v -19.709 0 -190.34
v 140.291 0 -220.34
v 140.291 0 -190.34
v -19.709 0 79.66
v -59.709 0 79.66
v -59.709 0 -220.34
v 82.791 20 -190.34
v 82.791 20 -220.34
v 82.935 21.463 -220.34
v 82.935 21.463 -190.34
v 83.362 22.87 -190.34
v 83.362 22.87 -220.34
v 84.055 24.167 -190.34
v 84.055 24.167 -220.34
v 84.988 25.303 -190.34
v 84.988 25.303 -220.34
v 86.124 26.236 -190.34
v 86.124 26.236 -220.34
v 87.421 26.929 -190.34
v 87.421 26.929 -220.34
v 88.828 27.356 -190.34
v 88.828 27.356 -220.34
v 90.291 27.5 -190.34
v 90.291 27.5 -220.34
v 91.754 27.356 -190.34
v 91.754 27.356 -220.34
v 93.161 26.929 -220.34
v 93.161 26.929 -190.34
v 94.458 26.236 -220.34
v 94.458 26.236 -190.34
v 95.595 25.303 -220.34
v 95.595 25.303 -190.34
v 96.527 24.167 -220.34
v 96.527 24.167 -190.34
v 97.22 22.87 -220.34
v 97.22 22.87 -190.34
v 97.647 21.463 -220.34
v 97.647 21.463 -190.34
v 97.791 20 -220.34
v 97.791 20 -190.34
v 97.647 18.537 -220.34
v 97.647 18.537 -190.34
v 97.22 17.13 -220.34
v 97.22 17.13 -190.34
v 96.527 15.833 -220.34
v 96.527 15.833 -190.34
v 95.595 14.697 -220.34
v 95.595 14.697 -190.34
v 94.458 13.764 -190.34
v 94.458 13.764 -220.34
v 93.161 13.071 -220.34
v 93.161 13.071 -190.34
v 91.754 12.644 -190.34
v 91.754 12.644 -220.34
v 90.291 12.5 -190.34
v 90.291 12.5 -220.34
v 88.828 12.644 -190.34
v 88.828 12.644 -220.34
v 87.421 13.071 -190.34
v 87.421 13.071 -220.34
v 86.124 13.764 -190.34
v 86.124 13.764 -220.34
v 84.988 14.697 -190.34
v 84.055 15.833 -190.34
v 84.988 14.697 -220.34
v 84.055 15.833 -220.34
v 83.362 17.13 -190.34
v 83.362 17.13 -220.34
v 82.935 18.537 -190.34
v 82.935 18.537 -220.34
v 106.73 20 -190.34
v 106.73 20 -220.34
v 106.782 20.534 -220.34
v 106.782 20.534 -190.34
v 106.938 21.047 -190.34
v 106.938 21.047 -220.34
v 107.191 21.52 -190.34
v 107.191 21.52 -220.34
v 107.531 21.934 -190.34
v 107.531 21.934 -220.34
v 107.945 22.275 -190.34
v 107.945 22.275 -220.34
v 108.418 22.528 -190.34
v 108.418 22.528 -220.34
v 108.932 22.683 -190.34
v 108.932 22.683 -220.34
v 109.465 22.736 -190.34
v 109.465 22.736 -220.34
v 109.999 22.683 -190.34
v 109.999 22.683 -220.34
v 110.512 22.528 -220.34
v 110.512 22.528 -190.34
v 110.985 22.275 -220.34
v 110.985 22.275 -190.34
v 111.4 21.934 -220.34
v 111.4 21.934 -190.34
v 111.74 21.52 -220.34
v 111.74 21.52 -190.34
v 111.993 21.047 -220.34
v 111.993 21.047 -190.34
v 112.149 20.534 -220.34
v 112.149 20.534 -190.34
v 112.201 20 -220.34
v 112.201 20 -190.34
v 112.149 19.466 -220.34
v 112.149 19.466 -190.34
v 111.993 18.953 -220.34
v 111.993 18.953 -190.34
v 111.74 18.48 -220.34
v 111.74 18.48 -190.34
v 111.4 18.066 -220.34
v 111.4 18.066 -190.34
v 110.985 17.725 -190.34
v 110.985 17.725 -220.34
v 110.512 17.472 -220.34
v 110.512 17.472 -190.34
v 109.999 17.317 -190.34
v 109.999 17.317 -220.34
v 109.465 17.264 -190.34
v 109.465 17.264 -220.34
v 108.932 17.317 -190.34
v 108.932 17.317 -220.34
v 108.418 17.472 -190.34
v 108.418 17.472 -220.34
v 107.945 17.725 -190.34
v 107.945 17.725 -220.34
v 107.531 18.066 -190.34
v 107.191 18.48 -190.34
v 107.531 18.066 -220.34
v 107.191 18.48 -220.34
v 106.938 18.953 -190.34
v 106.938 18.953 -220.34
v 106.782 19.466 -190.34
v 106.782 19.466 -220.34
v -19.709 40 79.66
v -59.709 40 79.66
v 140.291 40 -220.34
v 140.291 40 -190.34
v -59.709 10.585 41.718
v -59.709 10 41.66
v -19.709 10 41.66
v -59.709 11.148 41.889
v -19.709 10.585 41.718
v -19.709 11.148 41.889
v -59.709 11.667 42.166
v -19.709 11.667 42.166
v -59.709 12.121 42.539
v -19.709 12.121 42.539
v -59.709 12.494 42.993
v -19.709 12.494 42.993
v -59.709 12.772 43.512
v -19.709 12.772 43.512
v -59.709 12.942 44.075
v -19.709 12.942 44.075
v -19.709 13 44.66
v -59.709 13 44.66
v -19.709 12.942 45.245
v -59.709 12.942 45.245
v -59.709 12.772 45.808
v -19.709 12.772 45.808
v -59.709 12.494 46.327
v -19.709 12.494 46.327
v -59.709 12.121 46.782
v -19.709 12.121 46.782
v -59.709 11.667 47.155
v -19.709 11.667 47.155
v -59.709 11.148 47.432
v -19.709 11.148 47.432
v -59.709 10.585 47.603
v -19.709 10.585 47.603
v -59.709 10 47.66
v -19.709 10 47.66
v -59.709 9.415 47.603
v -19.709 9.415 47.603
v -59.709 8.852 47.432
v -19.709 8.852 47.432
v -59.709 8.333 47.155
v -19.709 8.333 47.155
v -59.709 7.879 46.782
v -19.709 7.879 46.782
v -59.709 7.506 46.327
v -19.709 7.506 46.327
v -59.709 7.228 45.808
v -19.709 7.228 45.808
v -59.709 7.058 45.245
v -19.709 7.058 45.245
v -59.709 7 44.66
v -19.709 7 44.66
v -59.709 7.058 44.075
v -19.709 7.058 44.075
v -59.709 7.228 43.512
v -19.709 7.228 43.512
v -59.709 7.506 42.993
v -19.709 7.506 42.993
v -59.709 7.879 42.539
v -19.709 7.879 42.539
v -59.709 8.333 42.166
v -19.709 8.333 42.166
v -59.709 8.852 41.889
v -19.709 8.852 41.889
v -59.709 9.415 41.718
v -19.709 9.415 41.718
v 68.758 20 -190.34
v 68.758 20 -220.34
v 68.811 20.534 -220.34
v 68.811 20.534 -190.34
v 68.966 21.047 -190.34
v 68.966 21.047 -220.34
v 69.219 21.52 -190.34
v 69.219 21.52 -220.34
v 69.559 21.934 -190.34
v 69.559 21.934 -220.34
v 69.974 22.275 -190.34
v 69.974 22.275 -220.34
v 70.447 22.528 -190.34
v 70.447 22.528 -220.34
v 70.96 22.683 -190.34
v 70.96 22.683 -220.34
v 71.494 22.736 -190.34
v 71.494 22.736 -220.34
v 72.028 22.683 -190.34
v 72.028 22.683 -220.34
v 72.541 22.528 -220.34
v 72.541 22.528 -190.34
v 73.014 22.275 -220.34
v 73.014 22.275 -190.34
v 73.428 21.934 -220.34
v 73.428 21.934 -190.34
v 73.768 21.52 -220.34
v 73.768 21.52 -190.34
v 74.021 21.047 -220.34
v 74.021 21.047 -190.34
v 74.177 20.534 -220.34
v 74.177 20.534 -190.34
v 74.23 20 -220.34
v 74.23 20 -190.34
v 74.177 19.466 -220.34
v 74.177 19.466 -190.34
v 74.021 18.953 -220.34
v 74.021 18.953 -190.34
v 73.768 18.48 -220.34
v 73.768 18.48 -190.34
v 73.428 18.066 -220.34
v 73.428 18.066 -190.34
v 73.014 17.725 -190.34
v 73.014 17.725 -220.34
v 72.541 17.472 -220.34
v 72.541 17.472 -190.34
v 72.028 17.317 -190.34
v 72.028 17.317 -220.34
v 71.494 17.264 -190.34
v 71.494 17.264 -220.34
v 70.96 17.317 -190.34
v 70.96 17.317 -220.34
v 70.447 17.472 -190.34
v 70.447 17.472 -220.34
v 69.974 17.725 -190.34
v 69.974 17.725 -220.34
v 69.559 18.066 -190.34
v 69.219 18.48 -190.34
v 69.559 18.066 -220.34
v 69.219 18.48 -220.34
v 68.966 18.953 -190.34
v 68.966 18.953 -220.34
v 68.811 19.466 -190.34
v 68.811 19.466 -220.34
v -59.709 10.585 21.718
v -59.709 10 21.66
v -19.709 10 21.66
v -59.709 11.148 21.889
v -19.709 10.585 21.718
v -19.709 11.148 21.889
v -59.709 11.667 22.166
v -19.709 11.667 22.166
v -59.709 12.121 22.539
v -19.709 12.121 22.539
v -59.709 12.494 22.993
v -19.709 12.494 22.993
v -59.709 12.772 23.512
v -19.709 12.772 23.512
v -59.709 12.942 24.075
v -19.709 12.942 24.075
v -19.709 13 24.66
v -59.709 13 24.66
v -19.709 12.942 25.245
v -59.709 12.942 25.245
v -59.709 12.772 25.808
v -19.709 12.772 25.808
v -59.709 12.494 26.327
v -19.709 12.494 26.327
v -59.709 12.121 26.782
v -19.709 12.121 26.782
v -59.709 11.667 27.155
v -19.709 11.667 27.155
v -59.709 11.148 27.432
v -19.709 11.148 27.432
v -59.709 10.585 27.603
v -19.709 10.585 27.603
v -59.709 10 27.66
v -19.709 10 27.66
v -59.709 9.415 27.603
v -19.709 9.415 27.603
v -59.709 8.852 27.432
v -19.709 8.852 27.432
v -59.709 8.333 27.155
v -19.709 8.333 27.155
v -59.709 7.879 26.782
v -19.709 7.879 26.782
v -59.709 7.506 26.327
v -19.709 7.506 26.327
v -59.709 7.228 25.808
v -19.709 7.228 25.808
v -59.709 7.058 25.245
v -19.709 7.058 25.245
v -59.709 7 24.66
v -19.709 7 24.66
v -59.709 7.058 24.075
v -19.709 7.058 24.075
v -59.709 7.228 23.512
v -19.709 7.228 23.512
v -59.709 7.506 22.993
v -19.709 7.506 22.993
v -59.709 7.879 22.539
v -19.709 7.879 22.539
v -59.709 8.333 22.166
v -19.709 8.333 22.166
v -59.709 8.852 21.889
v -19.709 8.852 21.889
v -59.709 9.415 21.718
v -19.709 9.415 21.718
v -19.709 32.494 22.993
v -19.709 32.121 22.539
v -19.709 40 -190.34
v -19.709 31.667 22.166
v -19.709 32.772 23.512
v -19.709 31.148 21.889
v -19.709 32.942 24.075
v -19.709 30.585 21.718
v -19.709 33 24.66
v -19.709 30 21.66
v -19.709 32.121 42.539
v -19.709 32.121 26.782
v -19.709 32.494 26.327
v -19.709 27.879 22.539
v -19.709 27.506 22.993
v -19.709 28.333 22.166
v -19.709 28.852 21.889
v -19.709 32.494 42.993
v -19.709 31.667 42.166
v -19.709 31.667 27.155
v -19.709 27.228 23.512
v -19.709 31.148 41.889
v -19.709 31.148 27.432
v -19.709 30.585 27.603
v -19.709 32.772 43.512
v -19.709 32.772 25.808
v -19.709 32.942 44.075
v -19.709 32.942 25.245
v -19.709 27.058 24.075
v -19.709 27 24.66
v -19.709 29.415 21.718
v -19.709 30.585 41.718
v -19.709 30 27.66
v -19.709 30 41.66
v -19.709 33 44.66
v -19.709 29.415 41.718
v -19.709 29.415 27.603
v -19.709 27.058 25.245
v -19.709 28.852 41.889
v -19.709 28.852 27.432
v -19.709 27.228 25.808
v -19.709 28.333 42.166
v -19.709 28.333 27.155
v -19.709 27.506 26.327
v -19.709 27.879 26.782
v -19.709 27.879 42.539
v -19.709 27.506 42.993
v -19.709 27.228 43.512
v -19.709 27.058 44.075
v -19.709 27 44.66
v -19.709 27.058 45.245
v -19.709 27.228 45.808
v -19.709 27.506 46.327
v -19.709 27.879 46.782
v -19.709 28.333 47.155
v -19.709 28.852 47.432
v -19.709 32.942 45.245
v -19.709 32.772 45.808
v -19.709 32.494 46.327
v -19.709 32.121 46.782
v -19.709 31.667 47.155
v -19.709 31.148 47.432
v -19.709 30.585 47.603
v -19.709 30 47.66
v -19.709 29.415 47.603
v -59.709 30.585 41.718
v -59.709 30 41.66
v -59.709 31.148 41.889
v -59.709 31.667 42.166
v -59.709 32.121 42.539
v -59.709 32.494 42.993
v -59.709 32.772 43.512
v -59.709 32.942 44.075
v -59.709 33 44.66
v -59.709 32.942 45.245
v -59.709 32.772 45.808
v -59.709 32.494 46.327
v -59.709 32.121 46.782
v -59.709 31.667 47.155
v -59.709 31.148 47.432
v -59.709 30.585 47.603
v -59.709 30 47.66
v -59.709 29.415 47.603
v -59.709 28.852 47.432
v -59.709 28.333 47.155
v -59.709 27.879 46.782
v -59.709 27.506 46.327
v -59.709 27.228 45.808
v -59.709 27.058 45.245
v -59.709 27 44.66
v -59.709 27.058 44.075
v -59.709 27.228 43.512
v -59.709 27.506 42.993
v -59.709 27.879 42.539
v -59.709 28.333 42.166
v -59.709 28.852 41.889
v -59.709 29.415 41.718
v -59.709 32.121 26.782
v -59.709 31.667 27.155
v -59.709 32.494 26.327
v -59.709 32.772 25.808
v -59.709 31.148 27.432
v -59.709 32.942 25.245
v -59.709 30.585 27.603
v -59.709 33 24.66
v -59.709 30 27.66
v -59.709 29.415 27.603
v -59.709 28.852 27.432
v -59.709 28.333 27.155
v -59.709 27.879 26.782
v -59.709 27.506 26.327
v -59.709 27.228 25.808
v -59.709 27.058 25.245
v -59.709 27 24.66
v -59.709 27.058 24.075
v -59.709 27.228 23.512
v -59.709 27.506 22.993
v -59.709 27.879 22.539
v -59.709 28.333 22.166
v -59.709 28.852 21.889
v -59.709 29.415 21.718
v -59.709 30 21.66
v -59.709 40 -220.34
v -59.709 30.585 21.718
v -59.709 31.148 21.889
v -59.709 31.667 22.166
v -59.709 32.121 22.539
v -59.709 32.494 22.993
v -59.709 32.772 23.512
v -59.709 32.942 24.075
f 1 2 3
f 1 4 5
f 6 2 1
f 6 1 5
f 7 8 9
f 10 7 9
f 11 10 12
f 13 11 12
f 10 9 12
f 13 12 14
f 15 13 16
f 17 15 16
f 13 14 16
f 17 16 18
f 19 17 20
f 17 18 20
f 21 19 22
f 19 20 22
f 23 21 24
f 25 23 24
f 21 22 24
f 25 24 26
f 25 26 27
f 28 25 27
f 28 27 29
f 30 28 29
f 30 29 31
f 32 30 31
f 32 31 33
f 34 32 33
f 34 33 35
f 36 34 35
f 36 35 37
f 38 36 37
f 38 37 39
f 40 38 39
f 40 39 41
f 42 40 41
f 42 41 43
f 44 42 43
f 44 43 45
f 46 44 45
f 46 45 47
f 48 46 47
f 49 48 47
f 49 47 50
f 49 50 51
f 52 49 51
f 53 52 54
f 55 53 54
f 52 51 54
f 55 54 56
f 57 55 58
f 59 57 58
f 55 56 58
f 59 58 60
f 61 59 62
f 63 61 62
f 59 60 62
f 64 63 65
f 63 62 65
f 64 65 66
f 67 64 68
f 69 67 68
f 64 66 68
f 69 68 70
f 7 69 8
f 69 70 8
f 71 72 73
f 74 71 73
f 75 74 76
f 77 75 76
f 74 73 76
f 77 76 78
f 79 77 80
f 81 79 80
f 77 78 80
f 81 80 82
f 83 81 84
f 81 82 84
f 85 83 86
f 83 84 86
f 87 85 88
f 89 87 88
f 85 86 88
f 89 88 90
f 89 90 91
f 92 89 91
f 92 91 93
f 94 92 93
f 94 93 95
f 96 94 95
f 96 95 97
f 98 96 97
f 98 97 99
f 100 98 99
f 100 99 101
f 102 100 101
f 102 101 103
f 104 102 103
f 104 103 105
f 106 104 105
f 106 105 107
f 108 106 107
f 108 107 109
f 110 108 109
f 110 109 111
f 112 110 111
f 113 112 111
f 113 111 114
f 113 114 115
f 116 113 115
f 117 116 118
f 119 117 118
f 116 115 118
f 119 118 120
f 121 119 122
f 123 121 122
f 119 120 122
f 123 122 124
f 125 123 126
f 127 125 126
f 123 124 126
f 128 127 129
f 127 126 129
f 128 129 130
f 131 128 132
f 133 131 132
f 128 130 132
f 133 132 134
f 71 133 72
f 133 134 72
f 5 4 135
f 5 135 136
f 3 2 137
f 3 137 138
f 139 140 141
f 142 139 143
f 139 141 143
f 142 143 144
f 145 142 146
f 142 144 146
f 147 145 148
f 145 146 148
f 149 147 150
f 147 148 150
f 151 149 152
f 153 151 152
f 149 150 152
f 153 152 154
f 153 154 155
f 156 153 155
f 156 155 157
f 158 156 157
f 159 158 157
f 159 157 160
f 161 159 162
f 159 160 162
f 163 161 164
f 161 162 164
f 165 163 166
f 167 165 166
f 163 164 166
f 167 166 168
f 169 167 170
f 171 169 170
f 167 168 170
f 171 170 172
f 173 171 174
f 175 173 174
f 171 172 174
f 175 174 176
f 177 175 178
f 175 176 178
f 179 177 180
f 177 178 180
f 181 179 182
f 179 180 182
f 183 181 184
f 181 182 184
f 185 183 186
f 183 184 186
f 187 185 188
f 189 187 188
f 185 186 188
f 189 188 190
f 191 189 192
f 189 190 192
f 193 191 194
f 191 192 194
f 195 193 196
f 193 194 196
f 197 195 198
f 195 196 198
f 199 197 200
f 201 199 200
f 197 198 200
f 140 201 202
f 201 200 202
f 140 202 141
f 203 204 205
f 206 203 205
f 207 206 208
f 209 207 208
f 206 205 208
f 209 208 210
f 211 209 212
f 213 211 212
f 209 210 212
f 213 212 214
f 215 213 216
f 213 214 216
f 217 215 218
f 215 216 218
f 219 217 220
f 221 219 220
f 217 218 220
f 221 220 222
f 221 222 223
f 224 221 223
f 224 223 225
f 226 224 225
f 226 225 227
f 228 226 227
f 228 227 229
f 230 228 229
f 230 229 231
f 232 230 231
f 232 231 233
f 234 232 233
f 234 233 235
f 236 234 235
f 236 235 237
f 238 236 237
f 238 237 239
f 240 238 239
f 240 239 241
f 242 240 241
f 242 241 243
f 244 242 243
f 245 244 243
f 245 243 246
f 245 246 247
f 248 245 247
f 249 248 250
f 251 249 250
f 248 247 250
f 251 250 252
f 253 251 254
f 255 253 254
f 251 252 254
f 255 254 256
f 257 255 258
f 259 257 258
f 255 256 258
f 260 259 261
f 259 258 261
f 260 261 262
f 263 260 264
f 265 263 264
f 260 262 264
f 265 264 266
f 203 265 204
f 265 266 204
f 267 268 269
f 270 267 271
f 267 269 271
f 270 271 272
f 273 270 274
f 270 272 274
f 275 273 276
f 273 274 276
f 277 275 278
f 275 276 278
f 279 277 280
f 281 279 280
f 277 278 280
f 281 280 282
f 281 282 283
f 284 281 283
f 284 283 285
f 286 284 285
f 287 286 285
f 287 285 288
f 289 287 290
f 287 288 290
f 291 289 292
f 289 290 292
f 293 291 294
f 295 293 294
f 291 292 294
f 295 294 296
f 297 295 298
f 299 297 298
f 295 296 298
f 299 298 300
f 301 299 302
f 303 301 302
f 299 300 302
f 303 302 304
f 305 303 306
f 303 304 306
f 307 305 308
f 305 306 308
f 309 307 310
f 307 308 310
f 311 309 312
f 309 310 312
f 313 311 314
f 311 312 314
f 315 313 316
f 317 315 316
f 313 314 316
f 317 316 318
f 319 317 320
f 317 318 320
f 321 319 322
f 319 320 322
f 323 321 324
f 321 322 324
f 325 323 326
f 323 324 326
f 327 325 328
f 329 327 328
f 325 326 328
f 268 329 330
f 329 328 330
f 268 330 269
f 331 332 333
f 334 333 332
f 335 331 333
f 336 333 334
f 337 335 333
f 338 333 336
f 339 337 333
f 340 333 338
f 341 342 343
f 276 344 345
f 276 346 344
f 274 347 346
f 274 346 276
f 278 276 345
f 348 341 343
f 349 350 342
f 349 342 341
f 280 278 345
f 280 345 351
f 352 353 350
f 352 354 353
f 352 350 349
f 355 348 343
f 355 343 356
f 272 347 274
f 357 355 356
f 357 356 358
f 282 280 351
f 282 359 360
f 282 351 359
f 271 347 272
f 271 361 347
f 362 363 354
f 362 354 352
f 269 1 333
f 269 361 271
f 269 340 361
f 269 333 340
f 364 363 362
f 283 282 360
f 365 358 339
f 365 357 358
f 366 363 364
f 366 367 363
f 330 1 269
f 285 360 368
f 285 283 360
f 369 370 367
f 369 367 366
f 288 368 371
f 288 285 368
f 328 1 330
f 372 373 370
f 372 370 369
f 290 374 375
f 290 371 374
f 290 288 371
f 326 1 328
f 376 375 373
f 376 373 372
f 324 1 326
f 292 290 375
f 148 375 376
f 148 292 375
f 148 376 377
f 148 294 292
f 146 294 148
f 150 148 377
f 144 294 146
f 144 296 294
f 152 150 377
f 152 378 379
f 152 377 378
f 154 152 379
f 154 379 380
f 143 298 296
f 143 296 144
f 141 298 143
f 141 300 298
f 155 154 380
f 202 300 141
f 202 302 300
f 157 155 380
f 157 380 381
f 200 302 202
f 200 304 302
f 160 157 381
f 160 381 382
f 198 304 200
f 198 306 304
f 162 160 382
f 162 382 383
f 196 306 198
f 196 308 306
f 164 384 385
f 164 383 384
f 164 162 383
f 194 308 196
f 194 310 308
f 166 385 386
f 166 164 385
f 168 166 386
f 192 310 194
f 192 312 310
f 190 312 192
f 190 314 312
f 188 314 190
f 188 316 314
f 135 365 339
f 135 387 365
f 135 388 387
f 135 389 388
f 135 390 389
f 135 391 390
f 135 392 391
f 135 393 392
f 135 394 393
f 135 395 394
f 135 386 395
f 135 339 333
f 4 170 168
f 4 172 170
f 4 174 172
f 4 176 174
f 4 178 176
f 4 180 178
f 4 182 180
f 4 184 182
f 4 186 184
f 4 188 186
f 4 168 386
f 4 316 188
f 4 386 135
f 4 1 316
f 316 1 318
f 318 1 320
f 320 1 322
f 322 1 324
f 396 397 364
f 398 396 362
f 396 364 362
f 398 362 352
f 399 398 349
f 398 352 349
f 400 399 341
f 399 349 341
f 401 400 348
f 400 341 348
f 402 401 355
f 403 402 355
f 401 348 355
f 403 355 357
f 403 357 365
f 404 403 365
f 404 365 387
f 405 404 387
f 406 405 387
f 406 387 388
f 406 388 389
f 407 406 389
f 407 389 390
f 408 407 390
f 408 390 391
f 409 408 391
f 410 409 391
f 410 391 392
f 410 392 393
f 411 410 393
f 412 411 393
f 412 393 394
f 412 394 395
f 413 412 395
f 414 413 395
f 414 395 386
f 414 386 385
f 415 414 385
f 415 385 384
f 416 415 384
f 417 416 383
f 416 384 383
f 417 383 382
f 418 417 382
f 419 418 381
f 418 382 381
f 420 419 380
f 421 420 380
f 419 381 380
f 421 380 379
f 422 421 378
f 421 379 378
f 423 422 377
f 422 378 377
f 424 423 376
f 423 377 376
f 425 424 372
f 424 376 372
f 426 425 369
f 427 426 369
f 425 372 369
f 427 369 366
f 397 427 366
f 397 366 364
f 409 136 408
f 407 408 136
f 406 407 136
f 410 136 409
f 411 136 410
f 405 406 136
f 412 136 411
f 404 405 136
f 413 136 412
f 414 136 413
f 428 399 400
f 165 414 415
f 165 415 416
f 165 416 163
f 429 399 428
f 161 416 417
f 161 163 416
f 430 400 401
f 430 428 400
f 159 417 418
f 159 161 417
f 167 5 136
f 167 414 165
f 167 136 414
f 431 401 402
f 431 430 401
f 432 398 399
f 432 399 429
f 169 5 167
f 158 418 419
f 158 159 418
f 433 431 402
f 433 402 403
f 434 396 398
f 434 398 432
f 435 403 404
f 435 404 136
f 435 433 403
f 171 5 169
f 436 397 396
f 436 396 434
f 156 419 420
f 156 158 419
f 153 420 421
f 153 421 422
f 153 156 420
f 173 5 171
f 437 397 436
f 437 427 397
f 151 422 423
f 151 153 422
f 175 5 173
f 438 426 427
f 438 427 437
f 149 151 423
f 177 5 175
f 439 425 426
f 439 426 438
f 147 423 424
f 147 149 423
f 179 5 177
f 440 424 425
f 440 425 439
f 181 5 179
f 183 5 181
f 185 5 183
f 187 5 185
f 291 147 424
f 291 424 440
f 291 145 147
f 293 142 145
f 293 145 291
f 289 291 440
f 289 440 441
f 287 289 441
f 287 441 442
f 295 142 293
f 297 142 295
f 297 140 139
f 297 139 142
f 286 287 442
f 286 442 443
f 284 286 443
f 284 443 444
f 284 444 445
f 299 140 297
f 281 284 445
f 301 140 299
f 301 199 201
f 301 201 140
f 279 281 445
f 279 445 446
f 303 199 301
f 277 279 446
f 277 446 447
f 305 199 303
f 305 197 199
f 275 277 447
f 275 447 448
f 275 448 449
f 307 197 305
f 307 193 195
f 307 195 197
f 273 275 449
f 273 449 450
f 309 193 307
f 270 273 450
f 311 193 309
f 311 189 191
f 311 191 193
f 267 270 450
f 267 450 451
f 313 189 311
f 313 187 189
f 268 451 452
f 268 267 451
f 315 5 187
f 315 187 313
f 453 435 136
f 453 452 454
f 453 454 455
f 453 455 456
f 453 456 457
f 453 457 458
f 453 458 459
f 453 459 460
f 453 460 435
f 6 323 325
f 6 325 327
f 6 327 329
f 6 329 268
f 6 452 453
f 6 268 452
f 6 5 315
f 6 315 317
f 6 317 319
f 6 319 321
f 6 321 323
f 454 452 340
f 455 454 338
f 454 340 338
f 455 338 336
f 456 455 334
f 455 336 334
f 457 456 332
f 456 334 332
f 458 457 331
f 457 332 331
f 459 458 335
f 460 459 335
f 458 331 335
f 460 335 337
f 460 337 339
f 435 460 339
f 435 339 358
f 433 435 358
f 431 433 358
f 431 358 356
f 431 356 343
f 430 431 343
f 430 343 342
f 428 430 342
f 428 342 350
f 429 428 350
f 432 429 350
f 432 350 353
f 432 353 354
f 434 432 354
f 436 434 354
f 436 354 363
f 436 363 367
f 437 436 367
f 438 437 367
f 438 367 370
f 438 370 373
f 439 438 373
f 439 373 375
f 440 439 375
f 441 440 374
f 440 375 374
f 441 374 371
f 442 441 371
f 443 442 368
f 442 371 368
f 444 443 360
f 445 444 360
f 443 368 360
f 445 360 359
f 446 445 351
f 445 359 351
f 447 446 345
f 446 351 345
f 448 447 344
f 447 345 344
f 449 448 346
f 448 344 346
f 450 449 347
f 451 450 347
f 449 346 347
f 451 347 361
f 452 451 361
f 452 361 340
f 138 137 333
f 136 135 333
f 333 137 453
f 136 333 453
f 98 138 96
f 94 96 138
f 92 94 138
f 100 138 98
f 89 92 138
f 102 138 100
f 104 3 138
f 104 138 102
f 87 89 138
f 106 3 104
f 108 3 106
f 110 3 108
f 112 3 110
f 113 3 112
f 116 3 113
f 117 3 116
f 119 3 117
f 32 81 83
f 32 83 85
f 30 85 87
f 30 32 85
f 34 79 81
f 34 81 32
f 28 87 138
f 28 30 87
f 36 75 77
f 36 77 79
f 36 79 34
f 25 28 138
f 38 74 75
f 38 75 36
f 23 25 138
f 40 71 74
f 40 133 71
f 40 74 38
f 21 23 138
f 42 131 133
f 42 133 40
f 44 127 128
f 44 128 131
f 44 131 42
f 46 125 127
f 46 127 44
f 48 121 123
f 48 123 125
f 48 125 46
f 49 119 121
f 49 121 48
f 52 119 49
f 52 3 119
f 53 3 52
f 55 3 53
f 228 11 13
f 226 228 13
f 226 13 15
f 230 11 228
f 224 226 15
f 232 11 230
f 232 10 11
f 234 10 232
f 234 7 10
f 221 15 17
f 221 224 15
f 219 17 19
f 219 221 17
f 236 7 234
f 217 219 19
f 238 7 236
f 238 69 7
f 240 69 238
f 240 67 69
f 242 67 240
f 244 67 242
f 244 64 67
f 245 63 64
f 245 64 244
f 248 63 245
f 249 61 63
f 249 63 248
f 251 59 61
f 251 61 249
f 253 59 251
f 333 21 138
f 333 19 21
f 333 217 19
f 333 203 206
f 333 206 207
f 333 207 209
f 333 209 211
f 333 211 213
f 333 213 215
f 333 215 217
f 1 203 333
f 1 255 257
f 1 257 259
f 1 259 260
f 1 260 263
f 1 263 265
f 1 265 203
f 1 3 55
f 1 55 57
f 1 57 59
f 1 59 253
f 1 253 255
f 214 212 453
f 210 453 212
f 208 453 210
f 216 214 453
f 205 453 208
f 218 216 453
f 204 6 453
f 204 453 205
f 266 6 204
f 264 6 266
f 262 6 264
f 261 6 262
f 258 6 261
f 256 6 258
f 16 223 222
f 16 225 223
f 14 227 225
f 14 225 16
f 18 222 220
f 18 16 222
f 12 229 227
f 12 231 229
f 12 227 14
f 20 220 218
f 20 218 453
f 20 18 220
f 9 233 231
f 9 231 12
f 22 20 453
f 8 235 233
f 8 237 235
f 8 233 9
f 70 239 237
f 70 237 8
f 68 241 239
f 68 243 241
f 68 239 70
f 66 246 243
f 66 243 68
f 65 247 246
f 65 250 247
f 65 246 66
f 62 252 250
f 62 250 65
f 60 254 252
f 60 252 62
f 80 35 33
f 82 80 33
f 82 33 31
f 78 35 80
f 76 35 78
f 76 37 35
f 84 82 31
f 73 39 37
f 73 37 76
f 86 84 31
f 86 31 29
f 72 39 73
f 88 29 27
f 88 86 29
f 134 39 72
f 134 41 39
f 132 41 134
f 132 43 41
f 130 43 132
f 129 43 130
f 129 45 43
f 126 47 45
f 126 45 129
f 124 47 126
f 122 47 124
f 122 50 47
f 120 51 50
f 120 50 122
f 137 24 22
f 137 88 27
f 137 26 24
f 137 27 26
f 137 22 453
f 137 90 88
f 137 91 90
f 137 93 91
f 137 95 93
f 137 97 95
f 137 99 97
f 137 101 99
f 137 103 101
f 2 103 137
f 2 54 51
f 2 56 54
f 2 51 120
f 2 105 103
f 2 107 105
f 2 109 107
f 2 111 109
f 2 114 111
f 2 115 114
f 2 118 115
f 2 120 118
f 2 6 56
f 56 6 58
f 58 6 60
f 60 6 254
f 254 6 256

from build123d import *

# Parameters (mm, degrees)
BOSS_EXTRUDE2_DEPTH = 40
SKETCH3_R           = 3
CUT_EXTRUDE1_DEPTH  = 265.256065707
SKETCH4_R           = 3
CUT_EXTRUDE2_DEPTH  = 40
SKETCH5_R           = 7.5
CUT_EXTRUDE3_DEPTH  = 40
SKETCH6_R           = 2.735775354
CUT_EXTRUDE4_DEPTH  = 40


with BuildPart() as part:
    # Sketch2 → Boss-Extrude2 (new body)
    with BuildSketch(Plane(origin=(0, 0, 0), x_dir=(1, 0, 0), z_dir=(0, 1, 0))):
        Polygon((-59.708737864, 220.339805825), (140.291262136, 220.339805825), (140.291262136, 190.339805825), (-19.708737864, 190.339805825), (-19.708737864, -79.660194175), (-59.708737864, -79.660194175), align=None)
    extrude(amount=BOSS_EXTRUDE2_DEPTH)

    # Sketch3 → Cut-Extrude1 (cut, through all)
    with BuildSketch(Plane(origin=(0, 0, 0), x_dir=(0, 0, -1), z_dir=(1, 0, 0))):
        with Locations((-24.660194175, 30)):
            Circle(SKETCH3_R)
        with Locations((-44.660194175, 30)):
            Circle(SKETCH3_R)
    extrude(amount=-CUT_EXTRUDE1_DEPTH, mode=Mode.SUBTRACT)

    # Sketch4 → Cut-Extrude2 (cut)
    with BuildSketch(Plane(origin=(-19.708737864, 0, 0), x_dir=(0, 0, -1), z_dir=(1, 0, 0))):
        with Locations((-44.660194175, 10)):
            Circle(SKETCH4_R)
        with Locations((-24.660194175, 10)):
            Circle(SKETCH4_R)
    extrude(amount=-CUT_EXTRUDE2_DEPTH, mode=Mode.SUBTRACT)

    # Sketch5 → Cut-Extrude3 (cut)
    with BuildSketch(Plane(origin=(0, 0, -220.339805825), x_dir=(-1, 0, 0), z_dir=(0, 0, -1))):
        with Locations((-90.291262136, 20)):
            Circle(SKETCH5_R)
    extrude(amount=-CUT_EXTRUDE3_DEPTH, mode=Mode.SUBTRACT)

    # Sketch6 → Cut-Extrude4 (cut)
    with BuildSketch(Plane(origin=(0, 0, -220.339805825), x_dir=(-1, 0, 0), z_dir=(0, 0, -1))):
        with Locations((-109.465398349, 20)):
            Circle(SKETCH6_R)
        with Locations((-71.49377823, 20)):
            Circle(SKETCH6_R)
    extrude(amount=-CUT_EXTRUDE4_DEPTH, mode=Mode.SUBTRACT)


solid = part.part
